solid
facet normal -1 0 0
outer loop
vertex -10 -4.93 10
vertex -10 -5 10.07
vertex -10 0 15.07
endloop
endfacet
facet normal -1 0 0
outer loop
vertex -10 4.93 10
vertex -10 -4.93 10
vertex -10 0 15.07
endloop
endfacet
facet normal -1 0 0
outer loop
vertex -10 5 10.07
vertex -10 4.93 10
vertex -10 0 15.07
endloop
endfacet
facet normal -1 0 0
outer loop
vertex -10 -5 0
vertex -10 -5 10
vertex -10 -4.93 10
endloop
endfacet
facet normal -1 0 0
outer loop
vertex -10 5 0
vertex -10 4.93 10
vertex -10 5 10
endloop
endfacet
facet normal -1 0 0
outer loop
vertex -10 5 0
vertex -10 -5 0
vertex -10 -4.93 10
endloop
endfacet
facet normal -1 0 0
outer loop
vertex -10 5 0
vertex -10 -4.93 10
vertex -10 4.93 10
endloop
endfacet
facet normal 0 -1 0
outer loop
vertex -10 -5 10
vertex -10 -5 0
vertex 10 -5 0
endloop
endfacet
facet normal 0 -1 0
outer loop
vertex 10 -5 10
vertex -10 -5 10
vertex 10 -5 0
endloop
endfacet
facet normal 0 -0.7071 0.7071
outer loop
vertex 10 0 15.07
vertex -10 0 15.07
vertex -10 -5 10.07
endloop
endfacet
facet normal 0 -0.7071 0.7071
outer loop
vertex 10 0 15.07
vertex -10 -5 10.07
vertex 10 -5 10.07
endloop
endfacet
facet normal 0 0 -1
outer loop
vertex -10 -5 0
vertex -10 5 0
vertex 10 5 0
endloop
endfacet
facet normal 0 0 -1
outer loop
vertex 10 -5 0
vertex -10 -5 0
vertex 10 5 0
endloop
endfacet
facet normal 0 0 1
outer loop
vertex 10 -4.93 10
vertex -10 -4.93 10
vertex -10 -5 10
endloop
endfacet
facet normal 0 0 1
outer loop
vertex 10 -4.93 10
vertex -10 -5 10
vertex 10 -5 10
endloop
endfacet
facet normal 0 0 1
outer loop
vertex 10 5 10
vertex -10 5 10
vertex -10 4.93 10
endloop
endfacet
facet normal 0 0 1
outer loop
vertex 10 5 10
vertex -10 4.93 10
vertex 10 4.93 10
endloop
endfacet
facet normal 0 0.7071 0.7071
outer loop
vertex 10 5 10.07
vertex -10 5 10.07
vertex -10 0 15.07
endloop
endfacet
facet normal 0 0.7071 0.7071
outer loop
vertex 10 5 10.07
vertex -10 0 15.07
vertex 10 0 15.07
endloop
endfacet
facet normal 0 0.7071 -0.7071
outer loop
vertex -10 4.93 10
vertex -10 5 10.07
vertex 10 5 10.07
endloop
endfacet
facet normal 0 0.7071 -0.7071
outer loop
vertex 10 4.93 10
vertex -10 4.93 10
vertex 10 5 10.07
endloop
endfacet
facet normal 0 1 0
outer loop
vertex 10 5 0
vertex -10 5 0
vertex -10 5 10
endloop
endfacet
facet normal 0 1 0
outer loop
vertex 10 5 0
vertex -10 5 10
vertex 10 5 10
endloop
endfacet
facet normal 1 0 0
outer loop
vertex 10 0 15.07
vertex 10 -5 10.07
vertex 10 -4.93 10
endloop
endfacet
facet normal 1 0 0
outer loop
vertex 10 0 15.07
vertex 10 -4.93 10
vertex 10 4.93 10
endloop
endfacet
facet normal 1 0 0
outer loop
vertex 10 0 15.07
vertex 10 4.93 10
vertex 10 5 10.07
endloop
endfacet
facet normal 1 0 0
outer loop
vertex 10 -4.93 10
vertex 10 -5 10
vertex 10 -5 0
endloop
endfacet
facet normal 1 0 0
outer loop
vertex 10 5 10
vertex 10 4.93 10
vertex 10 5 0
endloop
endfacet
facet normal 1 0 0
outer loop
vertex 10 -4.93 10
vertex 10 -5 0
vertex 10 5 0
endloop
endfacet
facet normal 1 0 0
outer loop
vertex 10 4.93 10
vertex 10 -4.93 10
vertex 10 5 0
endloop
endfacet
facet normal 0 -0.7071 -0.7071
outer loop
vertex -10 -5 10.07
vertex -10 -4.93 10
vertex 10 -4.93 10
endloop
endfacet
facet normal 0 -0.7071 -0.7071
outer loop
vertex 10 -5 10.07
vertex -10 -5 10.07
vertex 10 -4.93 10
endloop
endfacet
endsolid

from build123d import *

# Parameters (mm, degrees)
BOX002_W               = 20
BOX002_H               = 7.071
BOX002_DEPTH           = 7.071
BOX002_PLACEMENT_ANGLE = 45
BOX001_W               = 20
BOX001_H               = 10
BOX001_DEPTH           = 10


with BuildPart() as cub002:
    # Box002 → Box002 (new body)
    with BuildSketch(Plane.XY):
        with Locations((10, 3.5355)):
            Rectangle(BOX002_W, BOX002_H)
    extrude(amount=BOX002_DEPTH)


with BuildPart() as cub002_1:
    # Box002 placement: moved
    add(cub002.part.moved(Location((-10, 0, 5.07))).rotate(Axis((-10, 0, 5.07), (1, 0, 0)), BOX002_PLACEMENT_ANGLE))


with BuildPart() as fusion:
    # Box001 → Box001 (new body)
    with BuildSketch(Plane(origin=(-10, -5, 0), x_dir=(1, 0, 0), z_dir=(0, 0, 1))):
        with Locations((10, 5)):
            Rectangle(BOX001_W, BOX001_H)
    extrude(amount=BOX001_DEPTH)

    # Fusion: union Cub002
    add(cub002_1.part)


solid = fusion.part
